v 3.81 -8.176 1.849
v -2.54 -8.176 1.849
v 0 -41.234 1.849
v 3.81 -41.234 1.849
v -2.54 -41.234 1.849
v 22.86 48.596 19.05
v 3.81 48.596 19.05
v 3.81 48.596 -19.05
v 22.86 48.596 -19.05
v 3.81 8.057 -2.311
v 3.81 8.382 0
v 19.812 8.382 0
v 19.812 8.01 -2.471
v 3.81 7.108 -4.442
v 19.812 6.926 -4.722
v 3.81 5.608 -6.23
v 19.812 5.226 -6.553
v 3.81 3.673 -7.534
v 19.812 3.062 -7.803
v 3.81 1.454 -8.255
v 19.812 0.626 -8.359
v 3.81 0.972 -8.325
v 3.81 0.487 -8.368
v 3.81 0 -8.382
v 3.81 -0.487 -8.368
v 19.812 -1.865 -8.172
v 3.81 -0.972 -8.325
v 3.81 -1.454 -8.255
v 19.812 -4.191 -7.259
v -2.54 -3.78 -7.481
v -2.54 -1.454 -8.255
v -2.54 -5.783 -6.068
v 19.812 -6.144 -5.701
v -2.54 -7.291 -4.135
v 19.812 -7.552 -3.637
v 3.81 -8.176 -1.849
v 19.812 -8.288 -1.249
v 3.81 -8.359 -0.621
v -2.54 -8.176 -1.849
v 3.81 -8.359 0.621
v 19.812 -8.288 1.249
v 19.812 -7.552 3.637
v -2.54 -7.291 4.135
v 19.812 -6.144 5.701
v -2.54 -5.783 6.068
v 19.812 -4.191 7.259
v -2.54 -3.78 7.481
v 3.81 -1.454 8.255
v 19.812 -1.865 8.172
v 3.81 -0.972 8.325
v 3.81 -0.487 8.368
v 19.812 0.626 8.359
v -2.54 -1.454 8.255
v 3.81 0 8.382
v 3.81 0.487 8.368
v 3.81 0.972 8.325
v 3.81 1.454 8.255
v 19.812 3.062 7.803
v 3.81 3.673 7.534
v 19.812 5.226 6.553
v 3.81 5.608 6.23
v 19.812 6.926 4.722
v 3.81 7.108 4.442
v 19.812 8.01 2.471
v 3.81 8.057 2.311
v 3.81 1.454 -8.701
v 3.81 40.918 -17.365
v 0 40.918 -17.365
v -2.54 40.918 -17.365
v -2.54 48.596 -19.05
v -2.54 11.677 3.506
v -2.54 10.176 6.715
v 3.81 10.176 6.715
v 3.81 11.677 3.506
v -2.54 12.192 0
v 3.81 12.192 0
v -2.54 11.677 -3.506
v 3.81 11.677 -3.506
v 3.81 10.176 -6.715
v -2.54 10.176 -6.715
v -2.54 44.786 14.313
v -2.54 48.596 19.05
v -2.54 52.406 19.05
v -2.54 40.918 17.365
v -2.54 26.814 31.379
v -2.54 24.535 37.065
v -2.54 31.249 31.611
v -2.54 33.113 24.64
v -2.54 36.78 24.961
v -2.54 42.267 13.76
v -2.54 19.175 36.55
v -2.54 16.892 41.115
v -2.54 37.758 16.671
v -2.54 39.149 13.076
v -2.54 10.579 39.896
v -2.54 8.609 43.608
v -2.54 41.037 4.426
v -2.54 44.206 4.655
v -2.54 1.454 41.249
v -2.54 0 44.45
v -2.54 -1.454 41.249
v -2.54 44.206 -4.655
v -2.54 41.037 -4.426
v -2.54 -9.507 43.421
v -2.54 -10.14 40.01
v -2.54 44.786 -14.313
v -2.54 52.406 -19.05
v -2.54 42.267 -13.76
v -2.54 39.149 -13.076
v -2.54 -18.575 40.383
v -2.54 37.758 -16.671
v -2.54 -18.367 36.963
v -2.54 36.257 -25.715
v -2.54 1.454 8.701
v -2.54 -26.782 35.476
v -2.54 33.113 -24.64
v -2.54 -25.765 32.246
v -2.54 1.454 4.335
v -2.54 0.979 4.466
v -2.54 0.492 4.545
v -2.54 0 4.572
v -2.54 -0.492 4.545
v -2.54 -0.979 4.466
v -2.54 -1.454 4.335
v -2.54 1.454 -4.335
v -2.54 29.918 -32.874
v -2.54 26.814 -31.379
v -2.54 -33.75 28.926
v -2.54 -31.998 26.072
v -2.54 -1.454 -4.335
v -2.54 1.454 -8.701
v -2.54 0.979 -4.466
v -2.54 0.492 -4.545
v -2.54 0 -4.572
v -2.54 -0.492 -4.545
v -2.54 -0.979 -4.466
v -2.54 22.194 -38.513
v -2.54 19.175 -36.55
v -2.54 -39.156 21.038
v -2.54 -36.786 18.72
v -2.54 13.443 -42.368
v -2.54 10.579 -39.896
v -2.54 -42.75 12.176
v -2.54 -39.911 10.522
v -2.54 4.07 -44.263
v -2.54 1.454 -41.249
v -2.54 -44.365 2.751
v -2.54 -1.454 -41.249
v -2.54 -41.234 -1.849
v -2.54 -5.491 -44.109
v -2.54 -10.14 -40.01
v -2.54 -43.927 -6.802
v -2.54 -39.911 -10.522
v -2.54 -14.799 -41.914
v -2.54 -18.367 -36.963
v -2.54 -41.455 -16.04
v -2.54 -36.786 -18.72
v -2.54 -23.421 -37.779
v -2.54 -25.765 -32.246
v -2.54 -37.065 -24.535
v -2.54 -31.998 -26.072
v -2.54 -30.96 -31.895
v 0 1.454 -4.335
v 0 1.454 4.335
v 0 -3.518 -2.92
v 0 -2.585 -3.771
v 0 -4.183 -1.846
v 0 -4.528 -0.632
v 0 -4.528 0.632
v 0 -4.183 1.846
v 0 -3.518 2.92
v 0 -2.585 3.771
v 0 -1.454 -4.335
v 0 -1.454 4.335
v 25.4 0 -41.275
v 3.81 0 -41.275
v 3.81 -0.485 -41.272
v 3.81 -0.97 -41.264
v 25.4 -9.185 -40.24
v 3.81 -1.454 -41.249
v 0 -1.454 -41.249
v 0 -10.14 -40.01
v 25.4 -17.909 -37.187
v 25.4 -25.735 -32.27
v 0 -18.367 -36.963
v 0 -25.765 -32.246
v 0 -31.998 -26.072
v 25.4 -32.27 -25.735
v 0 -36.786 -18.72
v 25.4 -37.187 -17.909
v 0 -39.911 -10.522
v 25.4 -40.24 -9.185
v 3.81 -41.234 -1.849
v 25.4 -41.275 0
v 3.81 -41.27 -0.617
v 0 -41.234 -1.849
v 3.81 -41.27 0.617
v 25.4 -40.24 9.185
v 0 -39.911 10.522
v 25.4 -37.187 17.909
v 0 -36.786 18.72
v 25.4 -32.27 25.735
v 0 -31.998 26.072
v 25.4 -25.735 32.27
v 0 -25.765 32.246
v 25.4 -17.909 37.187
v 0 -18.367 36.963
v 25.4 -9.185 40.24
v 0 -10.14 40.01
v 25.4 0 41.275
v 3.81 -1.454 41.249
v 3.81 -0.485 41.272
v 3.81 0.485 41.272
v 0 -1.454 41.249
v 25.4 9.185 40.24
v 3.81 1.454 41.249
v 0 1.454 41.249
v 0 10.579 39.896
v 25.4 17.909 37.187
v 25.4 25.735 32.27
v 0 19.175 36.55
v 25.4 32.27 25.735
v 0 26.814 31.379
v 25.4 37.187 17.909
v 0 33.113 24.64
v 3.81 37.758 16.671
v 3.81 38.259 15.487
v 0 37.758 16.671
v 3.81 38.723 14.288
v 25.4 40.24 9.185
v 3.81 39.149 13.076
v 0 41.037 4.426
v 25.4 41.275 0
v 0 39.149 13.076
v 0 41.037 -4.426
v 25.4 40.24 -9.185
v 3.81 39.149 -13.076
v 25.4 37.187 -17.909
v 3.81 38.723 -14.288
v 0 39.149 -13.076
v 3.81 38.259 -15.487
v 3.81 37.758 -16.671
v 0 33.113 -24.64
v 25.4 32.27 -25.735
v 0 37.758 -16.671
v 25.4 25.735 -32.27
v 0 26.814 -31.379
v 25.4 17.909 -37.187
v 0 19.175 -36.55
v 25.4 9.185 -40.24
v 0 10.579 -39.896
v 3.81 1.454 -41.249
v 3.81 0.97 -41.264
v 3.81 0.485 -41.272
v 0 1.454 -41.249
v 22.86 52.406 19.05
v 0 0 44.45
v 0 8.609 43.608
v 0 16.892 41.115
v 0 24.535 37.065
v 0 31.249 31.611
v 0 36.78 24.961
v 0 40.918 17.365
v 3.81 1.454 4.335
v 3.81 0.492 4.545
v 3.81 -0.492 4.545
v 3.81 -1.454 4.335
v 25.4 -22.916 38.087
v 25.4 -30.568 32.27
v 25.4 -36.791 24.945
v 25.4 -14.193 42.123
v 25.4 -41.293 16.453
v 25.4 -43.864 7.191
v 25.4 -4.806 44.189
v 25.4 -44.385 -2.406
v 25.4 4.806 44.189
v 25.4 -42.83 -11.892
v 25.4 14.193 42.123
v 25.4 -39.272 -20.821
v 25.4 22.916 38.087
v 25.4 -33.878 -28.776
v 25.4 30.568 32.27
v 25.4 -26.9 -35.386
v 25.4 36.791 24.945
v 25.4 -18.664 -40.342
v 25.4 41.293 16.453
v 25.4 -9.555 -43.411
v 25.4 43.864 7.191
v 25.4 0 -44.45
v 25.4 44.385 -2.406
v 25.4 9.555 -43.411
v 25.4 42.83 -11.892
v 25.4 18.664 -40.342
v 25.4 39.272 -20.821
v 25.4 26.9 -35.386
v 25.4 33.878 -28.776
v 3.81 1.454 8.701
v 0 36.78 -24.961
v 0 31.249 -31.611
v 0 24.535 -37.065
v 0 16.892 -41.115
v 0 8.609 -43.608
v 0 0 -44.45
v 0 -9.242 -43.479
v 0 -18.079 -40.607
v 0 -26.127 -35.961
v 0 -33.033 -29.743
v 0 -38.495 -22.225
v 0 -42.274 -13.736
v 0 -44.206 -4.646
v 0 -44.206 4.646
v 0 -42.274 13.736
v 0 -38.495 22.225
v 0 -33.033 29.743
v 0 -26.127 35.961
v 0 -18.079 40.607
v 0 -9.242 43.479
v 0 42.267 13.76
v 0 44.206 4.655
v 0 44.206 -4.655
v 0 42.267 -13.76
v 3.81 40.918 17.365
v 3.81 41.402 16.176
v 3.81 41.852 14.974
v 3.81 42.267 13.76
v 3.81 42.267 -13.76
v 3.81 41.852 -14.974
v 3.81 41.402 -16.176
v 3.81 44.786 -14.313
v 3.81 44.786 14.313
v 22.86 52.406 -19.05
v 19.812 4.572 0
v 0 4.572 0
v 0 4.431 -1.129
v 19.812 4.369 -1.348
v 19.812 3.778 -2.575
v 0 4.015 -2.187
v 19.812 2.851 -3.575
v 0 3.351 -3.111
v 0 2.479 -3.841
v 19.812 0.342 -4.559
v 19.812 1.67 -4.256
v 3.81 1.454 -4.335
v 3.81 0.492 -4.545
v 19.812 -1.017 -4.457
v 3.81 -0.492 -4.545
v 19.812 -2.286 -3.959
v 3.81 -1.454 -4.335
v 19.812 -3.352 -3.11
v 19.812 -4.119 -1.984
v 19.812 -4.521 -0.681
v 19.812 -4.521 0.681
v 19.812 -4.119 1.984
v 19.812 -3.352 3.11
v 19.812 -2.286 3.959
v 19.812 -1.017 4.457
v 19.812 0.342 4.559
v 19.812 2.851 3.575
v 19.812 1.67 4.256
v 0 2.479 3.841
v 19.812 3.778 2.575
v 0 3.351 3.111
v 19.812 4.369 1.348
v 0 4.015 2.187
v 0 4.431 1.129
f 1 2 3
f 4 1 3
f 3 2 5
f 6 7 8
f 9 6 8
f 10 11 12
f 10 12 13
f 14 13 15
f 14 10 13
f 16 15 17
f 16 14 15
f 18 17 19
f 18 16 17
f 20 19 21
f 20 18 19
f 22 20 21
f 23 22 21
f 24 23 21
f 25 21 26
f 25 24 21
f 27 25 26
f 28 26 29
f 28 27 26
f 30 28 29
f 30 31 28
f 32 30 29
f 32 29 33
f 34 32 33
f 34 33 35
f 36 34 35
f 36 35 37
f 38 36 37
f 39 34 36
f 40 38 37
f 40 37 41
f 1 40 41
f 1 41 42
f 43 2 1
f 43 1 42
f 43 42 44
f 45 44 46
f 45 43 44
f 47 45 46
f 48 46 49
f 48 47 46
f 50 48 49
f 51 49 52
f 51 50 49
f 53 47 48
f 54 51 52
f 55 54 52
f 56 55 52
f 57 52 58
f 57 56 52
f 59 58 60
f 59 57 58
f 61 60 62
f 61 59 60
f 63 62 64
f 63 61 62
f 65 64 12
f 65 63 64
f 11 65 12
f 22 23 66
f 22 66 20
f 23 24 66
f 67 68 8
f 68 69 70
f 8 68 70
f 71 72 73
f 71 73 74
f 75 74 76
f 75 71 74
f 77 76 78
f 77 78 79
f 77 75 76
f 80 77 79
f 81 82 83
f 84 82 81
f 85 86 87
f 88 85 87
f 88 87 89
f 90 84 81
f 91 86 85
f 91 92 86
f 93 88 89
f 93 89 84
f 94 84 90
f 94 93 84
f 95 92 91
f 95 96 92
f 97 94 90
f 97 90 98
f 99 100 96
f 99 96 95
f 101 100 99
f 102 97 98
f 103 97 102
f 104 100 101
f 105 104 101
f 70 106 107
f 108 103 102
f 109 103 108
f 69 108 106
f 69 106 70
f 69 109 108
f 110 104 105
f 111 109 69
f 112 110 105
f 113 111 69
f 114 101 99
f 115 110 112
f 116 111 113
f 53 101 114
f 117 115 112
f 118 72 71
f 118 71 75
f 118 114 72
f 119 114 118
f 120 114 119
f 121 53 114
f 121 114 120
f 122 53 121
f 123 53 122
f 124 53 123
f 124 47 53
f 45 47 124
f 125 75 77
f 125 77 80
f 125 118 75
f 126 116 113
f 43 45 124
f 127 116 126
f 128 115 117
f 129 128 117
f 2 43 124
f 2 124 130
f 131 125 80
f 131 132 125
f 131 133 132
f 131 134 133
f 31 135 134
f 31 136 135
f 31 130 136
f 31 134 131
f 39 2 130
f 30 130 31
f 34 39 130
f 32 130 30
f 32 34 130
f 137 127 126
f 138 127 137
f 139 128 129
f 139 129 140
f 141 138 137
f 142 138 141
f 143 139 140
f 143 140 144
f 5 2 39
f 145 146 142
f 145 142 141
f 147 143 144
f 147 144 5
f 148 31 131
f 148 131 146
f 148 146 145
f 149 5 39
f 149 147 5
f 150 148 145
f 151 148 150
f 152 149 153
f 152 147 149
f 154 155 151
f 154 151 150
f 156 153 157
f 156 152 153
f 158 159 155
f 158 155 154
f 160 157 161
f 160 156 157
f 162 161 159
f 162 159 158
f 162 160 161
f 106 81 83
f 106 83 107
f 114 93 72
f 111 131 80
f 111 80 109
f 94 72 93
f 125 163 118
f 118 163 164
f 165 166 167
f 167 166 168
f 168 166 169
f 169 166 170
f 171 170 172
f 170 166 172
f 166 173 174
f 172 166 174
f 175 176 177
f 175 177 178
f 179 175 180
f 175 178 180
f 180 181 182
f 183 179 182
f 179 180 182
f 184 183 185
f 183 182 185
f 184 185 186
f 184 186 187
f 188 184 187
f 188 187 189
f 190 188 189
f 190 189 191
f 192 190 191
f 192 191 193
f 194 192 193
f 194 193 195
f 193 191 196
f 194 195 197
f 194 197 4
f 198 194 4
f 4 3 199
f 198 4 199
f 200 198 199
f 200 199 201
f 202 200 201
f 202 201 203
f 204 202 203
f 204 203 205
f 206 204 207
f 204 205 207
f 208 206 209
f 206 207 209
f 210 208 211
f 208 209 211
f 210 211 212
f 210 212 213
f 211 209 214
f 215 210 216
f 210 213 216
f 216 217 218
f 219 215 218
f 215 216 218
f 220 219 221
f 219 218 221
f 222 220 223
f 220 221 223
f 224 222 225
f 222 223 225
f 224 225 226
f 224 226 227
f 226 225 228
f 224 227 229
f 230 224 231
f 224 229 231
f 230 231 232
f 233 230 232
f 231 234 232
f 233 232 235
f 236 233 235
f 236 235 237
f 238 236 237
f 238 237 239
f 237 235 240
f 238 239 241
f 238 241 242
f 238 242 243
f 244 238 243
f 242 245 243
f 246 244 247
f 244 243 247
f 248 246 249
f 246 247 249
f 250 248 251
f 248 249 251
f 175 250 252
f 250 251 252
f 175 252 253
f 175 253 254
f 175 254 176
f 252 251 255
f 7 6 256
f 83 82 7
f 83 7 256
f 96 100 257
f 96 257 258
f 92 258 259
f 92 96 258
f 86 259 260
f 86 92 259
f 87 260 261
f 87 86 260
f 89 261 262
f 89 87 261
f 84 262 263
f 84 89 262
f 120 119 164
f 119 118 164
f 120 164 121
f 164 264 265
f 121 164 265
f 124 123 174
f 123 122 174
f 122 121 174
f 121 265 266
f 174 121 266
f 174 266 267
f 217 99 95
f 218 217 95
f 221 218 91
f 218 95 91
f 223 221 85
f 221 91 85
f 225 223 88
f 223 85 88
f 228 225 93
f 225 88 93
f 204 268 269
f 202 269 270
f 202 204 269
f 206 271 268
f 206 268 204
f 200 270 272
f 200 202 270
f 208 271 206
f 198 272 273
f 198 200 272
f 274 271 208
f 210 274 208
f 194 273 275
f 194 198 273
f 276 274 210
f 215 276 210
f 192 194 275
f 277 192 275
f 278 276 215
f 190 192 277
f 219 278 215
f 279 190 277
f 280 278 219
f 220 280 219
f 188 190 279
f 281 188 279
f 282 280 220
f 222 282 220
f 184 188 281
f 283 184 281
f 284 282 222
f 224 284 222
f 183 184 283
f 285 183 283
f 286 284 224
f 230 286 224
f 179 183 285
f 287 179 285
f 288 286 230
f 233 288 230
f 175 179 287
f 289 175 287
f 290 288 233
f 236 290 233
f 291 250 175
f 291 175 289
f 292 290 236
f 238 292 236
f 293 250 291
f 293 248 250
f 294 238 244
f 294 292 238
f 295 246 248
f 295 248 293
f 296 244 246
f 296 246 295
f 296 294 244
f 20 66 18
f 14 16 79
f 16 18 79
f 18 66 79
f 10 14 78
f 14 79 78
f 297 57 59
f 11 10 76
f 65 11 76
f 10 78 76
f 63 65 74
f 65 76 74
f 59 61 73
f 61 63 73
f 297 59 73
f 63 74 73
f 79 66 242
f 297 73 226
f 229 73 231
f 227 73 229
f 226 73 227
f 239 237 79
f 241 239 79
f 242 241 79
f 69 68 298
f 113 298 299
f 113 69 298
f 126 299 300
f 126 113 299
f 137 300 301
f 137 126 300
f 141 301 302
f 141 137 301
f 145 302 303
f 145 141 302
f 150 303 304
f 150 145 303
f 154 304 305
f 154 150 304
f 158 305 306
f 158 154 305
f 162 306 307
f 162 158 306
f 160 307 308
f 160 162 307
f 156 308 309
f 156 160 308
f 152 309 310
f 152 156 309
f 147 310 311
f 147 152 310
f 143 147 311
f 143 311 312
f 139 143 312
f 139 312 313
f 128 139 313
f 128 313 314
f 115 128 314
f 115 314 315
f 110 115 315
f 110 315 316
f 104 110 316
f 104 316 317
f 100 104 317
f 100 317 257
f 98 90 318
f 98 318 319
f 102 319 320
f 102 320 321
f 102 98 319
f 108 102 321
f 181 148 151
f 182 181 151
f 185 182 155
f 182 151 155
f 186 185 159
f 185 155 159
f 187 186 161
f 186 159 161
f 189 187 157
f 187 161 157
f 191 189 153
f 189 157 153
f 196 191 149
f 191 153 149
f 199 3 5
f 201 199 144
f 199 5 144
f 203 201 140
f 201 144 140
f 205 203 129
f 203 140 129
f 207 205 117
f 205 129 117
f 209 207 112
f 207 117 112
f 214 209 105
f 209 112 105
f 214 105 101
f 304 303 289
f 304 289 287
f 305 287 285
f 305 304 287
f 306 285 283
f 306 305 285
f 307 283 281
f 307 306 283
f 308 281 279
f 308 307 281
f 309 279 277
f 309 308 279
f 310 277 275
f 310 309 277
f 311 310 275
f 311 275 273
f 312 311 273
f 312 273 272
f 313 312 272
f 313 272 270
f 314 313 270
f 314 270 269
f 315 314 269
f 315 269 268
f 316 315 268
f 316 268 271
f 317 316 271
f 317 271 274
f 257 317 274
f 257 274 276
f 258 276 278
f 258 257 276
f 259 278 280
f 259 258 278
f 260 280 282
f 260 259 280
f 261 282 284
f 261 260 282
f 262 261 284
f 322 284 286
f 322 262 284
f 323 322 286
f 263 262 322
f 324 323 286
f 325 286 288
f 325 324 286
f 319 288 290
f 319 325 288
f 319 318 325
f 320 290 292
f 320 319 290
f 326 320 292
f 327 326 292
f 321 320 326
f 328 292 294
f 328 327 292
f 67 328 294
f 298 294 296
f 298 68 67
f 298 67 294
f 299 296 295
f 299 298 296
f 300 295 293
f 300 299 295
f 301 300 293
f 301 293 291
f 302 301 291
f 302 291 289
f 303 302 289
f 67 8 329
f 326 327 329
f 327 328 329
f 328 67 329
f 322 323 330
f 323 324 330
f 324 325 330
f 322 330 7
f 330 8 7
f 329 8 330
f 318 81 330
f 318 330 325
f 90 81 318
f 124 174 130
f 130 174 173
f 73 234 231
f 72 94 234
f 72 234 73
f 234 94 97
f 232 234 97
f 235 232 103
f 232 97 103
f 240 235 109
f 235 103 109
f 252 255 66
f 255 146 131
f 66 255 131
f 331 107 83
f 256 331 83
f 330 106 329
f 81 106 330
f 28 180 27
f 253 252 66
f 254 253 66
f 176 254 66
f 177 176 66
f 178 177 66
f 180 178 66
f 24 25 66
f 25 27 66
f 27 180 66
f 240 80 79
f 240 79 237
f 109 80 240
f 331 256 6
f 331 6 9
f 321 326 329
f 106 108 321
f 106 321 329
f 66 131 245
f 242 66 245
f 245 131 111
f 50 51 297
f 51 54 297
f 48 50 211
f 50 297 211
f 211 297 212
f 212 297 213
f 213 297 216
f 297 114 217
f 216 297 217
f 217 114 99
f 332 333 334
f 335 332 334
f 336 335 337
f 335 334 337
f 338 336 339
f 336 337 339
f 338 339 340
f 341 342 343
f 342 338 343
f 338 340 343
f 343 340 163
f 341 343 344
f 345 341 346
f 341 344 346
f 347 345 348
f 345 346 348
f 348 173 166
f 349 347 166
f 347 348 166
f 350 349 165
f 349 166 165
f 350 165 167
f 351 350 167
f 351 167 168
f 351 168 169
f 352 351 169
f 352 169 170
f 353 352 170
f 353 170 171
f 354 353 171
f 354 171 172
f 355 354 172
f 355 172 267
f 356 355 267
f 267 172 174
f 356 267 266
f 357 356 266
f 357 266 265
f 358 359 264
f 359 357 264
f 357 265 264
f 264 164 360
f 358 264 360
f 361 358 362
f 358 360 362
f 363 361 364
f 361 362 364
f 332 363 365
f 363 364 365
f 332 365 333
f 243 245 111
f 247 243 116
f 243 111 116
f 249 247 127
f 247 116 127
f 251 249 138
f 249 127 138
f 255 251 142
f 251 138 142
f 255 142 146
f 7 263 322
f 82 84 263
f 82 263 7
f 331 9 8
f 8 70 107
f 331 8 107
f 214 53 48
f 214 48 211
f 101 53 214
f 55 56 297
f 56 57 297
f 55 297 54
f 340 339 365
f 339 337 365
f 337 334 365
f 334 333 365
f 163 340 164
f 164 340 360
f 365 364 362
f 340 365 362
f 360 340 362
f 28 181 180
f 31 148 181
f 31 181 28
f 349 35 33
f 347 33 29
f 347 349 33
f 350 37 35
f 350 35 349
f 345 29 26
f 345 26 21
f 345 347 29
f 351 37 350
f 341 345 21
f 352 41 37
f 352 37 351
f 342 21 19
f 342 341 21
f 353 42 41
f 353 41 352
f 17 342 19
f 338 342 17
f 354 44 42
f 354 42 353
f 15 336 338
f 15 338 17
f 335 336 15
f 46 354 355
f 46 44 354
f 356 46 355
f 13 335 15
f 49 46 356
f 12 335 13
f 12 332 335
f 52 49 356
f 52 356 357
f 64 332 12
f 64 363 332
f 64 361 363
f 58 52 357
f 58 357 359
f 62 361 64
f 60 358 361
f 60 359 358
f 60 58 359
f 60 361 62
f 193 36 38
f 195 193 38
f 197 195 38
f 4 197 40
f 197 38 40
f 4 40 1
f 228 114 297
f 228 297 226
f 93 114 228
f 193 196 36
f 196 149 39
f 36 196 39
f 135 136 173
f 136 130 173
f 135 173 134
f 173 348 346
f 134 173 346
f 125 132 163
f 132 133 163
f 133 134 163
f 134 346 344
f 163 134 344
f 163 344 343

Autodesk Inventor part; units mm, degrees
ref_plane "YZ Plane" through (0, 0, 0) normal (1, 0, 0) x (0, 1, 0)
ref_plane "XZ Plane" through (0, 0, 0) normal (0, 1, 0) x (-1, 0, 0)
ref_plane "XY Plane" through (0, 0, 0) normal (0, 0, 1) x (1, 0, 0)
sketch "Sketch1" plane through (0, 0, 0) normal (1, 0, 0) x (0, 1, 0)
  circle A0 centre (0, 0) radius 4.572
  circle A1 centre (0, 0) radius 8.382
  dimension "d0" = 9.144
  dimension "d1" = 3.81
extrude "Extrusion1" add sketch "Sketch1" along normal blind 19.812
sketch "Sketch2" plane through (0, 0, 0) normal (-1, 0, 0) x (0, 0, 1)
  circle A0 centre (0, 0) radius 8.382
  circle A1 centre (0, 0) radius 7.747
  circle A2 centre (0, 0) radius 8.382 projected
  dimension "d42" = 0
extrude "Extrusion2" add sketch "Sketch2" along normal blind 2.54 contours A0 | A1
sketch "Sketch3" plane through (-2.54, 0, 0) normal (-1, 0, 0) x (0, 0, 1)
  line L0 (19.05, 48.5955) -> (-19.05, 48.5955)
  circle A0 centre (0, 0) radius 8.382 projected
  line L1 (8.382, 0) -> (19.05, 48.5955)
  line L2 (-8.382, 0) -> (-19.05, 48.5955)
  arc A1 (8.382, 0) -> (-8.382, 0) centre (0, 0) ccw
  line L3 (-14.3129, 44.7855) -> (14.3129, 44.7855)
  line L4 (14.3129, 44.7855) -> (6.7152, 10.176)
  arc A2 (6.7152, 10.176) -> (-6.7152, 10.176) centre (0, 0) ccw
  line L5 (-6.7152, 10.176) -> (-14.3129, 44.7855)
  dimension "d6" = 38.1
  dimension "d7" = 19.05
  dimension "d8" = 3.81
extrude "Extrusion3" add sketch "Sketch3" against normal blind 6.35 contours L1 A0 L2 L0
sketch "Sketch6" plane through (-2.54, 44.7855, -14.3129) normal (0, -1, 0) x (1, 0, 0)
  line L0 (6.35, 32.4159) -> (26.9875, 32.4159) projected
  line L1 (13.4874, 32.4159) -> (13.4874, 26.0989)
  line L2 (26.9875, 32.4159) -> (26.9875, -3.9117) projected
  point P0 (2.54, 14.3129)
  dimension "d20" = 13.5001
sketch "Sketch10" plane through (0, 0, 0) normal (1, 0, 0) x (0, 0, -1)
  circle A0 centre (0, 0) radius 1.4542
  line L0 (-4.572, 1.4542) -> (4.572, 1.4542)
  line L1 (4.572, 1.4542) -> (4.572, -1.4542)
  line L2 (4.572, -1.4542) -> (-4.572, -1.4542)
  line L3 (-4.572, -1.4542) -> (-4.572, 1.4542)
  circle A1 centre (0, 0) radius 4.572 projected
  dimension "d43" = 0
  dimension "d44" = 0
extrude "Extrusion7" cut sketch "Sketch10" against normal blind 22.225 contours A0 | A0 L0 A1 L2 | A0 L2 A1 L0 | A1 L3 L0 | L0 L1 A1 | A1 L1 L2 | L2 L3 A1
sketch "Sketch13" plane through (-2.54, 48.5955, 19.05) normal (0, 1, 0) x (1, 0, 0)
  line L0 (4.6355, 36.83) -> (1.7145, 36.83)
  line L1 (1.7145, 36.83) -> (1.7145, 33.909)
  line L2 (1.7145, 33.909) -> (4.6355, 33.909)
  line L3 (4.6355, 33.909) -> (4.6355, 36.83)
  line L4 (6.35, 38.1) -> (6.35, 0) projected
  line L5 (0, 38.1) -> (6.35, 38.1) projected
  line L6 (4.6228, 4.191) -> (1.7018, 4.191)
  line L7 (1.7018, 4.191) -> (1.7018, 1.27)
  line L8 (1.7018, 1.27) -> (4.6228, 1.27)
  line L9 (4.6228, 1.27) -> (4.6228, 4.191)
  line L10 (0, 0) -> (6.35, 0) projected
  line L11 (0, 0) -> (0, 38.1) projected
  line L12 (0, 0) -> (6.35, 0) projected
  line L13 (6.35, 38.1) -> (6.35, 0) projected
  line L14 (0, 38.1) -> (6.35, 38.1) projected
  point P0 (2.54, 19.05)
  dimension "d32" = 2.921
  dimension "d33" = 2.921
  dimension "d34" = 1.7145
  dimension "d35" = 1.27
  dimension "d36" = 2.921
  dimension "d37" = 2.921
  dimension "d38" = 1.7272
  dimension "d39" = 1.27
extrude "Extrusion9" add sketch "Sketch13" along normal blind 3.81 contours L3 L2 L1 L0 | L4 L10 L11 L5 | L9 L8 L7 L6
sketch "Sketch14" plane through (0, 0, 0) normal (-1, 0, 0) x (0, 0, 1)
  arc A0 (4.3346, -1.4542) -> (4.572, 0) centre (0, 0) ccw projected
  line L0 (4.3346, -1.4542) -> (4.572, -1.4542) projected
  line L1 (4.572, -1.4542) -> (4.572, 0) projected
  arc A1 (4.572, 0) -> (4.3346, 1.4542) centre (0, 0) ccw projected
  line L2 (4.572, 0) -> (4.572, 1.4542) projected
  line L3 (4.572, 1.4542) -> (4.3346, 1.4542) projected
  arc A2 (-4.572, 0) -> (-4.3346, -1.4542) centre (0, 0) ccw projected
  line L4 (-4.572, 0) -> (-4.572, -1.4542) projected
  line L5 (-4.572, -1.4542) -> (-4.3346, -1.4542) projected
  arc A3 (-4.3346, 1.4542) -> (-4.572, 0) centre (0, 0) ccw projected
  line L6 (-4.3346, 1.4542) -> (-4.572, 1.4542) projected
  line L7 (-4.572, 1.4542) -> (-4.572, 0) projected
extrude "Extrusion10" add sketch "Sketch14" along normal blind 2.54
sketch "Sketch15" plane through (-2.54, 0, 0) normal (-1, 0, 0) x (0, 0, 1)
  circle A0 centre (0, 0) radius 41.275
  circle A1 centre (0, 0) radius 44.45
  dimension "d47" = 82.55
  dimension "d48" = 88.9
extrude "Extrusion11" add sketch "Sketch15" against normal blind 2.54
sketch "Sketch16" plane through (0, 0, 0) normal (1, 0, 0) x (0, 0, -1)
  circle A0 centre (0, 0) radius 44.45
  circle A1 centre (0, 0) radius 41.275
  dimension "d51" = 82.55
extrude "Extrusion12" add sketch "Sketch16" along normal blind 25.4
sketch "Sketch19" plane through (-2.54, 0, 0) normal (-1, 0, 0) x (0, 0, 1)
  line L0 (4.3346, 1.4542) -> (-4.3346, 1.4542) projected
  arc A0 (-16.671, 37.7585) -> (16.671, 37.7585) centre (0, 0) ccw projected
  line L1 (-4.3346, 1.4542) -> (-41.2494, 1.4542)
  line L2 (4.3346, 1.4542) -> (41.2494, 1.4542)
  circle A1 centre (0, 0) radius 8.382
  line L3 (-4.3346, -1.4542) -> (4.3346, -1.4542)
  line L4 (4.3346, 1.4542) -> (-4.3346, 1.4542)
  line L5 (-41.2494, -1.4542) -> (41.2494, -1.4542)
extrude "Extrusion14" add sketch "Sketch19" against normal blind 6.35 contours L2 A1 L5 L3 L1 L0 | L2 A0 L5 A1 | A1 L5 A0 L1
sketch "Sketch20" plane through (3.81, 0, 0) normal (1, 0, 0) x (0, 0, -1)
  arc A0 (4.3346, -1.4542) -> (4.3346, 1.4542) centre (0, 0) ccw projected
  line L0 (4.3346, 1.4542) -> (-4.3346, 1.4542) projected
  arc A1 (-4.3346, 1.4542) -> (-4.3346, -1.4542) centre (0, 0) ccw projected
  line L1 (-4.3346, -1.4542) -> (4.3346, -1.4542) projected
extrude "Extrusion15" cut sketch "Sketch20" against normal blind 6.35
sketch "Sketch21" plane through (-2.54, 0, 0) normal (-1, 0, 0) x (0, 0, 1)
  arc A0 (-8.2549, -1.4542) -> (8.2549, -1.4542) centre (0, 0) ccw projected
  line L0 (1.8492, -8.1755) -> (1.8492, -41.2336)
  arc A1 (-41.2494, -1.4542) -> (41.2494, -1.4542) centre (0, 0) ccw projected
  line L1 (-1.8492, -41.2336) -> (-1.8492, -8.1755)
  arc A2 (-1.8492, -8.1755) -> (1.8492, -8.1755) centre (0, 0) ccw
  arc A3 (-1.8492, -41.2336) -> (1.8492, -41.2336) centre (0, 0) ccw
extrude "Extrusion16" add sketch "Sketch21" against normal blind 6.35
sketch "Sketch22" plane through (-2.54, 48.5955, 19.05) normal (0, 1, 0) x (1, 0, 0)
  point P0 (2.54, 19.05)
sketch "Sketch23" plane through (3.81, 0, 0) normal (1, 0, 0) x (0, 0, -1)
  line L0 (19.05, 52.4055) -> (-19.05, 52.4055) projected
  line L1 (-19.05, 48.5955) -> (-19.05, 52.4055) projected
  line L2 (19.05, 52.4055) -> (-19.05, 52.4055)
  line L3 (-19.05, 52.4055) -> (-19.05, 48.5955)
  line L4 (-19.05, 48.5955) -> (19.05, 48.5955)
  line L5 (19.05, 48.5955) -> (19.05, 52.4055)
  point P0 (0, 0)
extrude "Extrusion17" add sketch "Sketch23" along normal blind 19.05
properties part number "BasicThrustMotorHousing"
